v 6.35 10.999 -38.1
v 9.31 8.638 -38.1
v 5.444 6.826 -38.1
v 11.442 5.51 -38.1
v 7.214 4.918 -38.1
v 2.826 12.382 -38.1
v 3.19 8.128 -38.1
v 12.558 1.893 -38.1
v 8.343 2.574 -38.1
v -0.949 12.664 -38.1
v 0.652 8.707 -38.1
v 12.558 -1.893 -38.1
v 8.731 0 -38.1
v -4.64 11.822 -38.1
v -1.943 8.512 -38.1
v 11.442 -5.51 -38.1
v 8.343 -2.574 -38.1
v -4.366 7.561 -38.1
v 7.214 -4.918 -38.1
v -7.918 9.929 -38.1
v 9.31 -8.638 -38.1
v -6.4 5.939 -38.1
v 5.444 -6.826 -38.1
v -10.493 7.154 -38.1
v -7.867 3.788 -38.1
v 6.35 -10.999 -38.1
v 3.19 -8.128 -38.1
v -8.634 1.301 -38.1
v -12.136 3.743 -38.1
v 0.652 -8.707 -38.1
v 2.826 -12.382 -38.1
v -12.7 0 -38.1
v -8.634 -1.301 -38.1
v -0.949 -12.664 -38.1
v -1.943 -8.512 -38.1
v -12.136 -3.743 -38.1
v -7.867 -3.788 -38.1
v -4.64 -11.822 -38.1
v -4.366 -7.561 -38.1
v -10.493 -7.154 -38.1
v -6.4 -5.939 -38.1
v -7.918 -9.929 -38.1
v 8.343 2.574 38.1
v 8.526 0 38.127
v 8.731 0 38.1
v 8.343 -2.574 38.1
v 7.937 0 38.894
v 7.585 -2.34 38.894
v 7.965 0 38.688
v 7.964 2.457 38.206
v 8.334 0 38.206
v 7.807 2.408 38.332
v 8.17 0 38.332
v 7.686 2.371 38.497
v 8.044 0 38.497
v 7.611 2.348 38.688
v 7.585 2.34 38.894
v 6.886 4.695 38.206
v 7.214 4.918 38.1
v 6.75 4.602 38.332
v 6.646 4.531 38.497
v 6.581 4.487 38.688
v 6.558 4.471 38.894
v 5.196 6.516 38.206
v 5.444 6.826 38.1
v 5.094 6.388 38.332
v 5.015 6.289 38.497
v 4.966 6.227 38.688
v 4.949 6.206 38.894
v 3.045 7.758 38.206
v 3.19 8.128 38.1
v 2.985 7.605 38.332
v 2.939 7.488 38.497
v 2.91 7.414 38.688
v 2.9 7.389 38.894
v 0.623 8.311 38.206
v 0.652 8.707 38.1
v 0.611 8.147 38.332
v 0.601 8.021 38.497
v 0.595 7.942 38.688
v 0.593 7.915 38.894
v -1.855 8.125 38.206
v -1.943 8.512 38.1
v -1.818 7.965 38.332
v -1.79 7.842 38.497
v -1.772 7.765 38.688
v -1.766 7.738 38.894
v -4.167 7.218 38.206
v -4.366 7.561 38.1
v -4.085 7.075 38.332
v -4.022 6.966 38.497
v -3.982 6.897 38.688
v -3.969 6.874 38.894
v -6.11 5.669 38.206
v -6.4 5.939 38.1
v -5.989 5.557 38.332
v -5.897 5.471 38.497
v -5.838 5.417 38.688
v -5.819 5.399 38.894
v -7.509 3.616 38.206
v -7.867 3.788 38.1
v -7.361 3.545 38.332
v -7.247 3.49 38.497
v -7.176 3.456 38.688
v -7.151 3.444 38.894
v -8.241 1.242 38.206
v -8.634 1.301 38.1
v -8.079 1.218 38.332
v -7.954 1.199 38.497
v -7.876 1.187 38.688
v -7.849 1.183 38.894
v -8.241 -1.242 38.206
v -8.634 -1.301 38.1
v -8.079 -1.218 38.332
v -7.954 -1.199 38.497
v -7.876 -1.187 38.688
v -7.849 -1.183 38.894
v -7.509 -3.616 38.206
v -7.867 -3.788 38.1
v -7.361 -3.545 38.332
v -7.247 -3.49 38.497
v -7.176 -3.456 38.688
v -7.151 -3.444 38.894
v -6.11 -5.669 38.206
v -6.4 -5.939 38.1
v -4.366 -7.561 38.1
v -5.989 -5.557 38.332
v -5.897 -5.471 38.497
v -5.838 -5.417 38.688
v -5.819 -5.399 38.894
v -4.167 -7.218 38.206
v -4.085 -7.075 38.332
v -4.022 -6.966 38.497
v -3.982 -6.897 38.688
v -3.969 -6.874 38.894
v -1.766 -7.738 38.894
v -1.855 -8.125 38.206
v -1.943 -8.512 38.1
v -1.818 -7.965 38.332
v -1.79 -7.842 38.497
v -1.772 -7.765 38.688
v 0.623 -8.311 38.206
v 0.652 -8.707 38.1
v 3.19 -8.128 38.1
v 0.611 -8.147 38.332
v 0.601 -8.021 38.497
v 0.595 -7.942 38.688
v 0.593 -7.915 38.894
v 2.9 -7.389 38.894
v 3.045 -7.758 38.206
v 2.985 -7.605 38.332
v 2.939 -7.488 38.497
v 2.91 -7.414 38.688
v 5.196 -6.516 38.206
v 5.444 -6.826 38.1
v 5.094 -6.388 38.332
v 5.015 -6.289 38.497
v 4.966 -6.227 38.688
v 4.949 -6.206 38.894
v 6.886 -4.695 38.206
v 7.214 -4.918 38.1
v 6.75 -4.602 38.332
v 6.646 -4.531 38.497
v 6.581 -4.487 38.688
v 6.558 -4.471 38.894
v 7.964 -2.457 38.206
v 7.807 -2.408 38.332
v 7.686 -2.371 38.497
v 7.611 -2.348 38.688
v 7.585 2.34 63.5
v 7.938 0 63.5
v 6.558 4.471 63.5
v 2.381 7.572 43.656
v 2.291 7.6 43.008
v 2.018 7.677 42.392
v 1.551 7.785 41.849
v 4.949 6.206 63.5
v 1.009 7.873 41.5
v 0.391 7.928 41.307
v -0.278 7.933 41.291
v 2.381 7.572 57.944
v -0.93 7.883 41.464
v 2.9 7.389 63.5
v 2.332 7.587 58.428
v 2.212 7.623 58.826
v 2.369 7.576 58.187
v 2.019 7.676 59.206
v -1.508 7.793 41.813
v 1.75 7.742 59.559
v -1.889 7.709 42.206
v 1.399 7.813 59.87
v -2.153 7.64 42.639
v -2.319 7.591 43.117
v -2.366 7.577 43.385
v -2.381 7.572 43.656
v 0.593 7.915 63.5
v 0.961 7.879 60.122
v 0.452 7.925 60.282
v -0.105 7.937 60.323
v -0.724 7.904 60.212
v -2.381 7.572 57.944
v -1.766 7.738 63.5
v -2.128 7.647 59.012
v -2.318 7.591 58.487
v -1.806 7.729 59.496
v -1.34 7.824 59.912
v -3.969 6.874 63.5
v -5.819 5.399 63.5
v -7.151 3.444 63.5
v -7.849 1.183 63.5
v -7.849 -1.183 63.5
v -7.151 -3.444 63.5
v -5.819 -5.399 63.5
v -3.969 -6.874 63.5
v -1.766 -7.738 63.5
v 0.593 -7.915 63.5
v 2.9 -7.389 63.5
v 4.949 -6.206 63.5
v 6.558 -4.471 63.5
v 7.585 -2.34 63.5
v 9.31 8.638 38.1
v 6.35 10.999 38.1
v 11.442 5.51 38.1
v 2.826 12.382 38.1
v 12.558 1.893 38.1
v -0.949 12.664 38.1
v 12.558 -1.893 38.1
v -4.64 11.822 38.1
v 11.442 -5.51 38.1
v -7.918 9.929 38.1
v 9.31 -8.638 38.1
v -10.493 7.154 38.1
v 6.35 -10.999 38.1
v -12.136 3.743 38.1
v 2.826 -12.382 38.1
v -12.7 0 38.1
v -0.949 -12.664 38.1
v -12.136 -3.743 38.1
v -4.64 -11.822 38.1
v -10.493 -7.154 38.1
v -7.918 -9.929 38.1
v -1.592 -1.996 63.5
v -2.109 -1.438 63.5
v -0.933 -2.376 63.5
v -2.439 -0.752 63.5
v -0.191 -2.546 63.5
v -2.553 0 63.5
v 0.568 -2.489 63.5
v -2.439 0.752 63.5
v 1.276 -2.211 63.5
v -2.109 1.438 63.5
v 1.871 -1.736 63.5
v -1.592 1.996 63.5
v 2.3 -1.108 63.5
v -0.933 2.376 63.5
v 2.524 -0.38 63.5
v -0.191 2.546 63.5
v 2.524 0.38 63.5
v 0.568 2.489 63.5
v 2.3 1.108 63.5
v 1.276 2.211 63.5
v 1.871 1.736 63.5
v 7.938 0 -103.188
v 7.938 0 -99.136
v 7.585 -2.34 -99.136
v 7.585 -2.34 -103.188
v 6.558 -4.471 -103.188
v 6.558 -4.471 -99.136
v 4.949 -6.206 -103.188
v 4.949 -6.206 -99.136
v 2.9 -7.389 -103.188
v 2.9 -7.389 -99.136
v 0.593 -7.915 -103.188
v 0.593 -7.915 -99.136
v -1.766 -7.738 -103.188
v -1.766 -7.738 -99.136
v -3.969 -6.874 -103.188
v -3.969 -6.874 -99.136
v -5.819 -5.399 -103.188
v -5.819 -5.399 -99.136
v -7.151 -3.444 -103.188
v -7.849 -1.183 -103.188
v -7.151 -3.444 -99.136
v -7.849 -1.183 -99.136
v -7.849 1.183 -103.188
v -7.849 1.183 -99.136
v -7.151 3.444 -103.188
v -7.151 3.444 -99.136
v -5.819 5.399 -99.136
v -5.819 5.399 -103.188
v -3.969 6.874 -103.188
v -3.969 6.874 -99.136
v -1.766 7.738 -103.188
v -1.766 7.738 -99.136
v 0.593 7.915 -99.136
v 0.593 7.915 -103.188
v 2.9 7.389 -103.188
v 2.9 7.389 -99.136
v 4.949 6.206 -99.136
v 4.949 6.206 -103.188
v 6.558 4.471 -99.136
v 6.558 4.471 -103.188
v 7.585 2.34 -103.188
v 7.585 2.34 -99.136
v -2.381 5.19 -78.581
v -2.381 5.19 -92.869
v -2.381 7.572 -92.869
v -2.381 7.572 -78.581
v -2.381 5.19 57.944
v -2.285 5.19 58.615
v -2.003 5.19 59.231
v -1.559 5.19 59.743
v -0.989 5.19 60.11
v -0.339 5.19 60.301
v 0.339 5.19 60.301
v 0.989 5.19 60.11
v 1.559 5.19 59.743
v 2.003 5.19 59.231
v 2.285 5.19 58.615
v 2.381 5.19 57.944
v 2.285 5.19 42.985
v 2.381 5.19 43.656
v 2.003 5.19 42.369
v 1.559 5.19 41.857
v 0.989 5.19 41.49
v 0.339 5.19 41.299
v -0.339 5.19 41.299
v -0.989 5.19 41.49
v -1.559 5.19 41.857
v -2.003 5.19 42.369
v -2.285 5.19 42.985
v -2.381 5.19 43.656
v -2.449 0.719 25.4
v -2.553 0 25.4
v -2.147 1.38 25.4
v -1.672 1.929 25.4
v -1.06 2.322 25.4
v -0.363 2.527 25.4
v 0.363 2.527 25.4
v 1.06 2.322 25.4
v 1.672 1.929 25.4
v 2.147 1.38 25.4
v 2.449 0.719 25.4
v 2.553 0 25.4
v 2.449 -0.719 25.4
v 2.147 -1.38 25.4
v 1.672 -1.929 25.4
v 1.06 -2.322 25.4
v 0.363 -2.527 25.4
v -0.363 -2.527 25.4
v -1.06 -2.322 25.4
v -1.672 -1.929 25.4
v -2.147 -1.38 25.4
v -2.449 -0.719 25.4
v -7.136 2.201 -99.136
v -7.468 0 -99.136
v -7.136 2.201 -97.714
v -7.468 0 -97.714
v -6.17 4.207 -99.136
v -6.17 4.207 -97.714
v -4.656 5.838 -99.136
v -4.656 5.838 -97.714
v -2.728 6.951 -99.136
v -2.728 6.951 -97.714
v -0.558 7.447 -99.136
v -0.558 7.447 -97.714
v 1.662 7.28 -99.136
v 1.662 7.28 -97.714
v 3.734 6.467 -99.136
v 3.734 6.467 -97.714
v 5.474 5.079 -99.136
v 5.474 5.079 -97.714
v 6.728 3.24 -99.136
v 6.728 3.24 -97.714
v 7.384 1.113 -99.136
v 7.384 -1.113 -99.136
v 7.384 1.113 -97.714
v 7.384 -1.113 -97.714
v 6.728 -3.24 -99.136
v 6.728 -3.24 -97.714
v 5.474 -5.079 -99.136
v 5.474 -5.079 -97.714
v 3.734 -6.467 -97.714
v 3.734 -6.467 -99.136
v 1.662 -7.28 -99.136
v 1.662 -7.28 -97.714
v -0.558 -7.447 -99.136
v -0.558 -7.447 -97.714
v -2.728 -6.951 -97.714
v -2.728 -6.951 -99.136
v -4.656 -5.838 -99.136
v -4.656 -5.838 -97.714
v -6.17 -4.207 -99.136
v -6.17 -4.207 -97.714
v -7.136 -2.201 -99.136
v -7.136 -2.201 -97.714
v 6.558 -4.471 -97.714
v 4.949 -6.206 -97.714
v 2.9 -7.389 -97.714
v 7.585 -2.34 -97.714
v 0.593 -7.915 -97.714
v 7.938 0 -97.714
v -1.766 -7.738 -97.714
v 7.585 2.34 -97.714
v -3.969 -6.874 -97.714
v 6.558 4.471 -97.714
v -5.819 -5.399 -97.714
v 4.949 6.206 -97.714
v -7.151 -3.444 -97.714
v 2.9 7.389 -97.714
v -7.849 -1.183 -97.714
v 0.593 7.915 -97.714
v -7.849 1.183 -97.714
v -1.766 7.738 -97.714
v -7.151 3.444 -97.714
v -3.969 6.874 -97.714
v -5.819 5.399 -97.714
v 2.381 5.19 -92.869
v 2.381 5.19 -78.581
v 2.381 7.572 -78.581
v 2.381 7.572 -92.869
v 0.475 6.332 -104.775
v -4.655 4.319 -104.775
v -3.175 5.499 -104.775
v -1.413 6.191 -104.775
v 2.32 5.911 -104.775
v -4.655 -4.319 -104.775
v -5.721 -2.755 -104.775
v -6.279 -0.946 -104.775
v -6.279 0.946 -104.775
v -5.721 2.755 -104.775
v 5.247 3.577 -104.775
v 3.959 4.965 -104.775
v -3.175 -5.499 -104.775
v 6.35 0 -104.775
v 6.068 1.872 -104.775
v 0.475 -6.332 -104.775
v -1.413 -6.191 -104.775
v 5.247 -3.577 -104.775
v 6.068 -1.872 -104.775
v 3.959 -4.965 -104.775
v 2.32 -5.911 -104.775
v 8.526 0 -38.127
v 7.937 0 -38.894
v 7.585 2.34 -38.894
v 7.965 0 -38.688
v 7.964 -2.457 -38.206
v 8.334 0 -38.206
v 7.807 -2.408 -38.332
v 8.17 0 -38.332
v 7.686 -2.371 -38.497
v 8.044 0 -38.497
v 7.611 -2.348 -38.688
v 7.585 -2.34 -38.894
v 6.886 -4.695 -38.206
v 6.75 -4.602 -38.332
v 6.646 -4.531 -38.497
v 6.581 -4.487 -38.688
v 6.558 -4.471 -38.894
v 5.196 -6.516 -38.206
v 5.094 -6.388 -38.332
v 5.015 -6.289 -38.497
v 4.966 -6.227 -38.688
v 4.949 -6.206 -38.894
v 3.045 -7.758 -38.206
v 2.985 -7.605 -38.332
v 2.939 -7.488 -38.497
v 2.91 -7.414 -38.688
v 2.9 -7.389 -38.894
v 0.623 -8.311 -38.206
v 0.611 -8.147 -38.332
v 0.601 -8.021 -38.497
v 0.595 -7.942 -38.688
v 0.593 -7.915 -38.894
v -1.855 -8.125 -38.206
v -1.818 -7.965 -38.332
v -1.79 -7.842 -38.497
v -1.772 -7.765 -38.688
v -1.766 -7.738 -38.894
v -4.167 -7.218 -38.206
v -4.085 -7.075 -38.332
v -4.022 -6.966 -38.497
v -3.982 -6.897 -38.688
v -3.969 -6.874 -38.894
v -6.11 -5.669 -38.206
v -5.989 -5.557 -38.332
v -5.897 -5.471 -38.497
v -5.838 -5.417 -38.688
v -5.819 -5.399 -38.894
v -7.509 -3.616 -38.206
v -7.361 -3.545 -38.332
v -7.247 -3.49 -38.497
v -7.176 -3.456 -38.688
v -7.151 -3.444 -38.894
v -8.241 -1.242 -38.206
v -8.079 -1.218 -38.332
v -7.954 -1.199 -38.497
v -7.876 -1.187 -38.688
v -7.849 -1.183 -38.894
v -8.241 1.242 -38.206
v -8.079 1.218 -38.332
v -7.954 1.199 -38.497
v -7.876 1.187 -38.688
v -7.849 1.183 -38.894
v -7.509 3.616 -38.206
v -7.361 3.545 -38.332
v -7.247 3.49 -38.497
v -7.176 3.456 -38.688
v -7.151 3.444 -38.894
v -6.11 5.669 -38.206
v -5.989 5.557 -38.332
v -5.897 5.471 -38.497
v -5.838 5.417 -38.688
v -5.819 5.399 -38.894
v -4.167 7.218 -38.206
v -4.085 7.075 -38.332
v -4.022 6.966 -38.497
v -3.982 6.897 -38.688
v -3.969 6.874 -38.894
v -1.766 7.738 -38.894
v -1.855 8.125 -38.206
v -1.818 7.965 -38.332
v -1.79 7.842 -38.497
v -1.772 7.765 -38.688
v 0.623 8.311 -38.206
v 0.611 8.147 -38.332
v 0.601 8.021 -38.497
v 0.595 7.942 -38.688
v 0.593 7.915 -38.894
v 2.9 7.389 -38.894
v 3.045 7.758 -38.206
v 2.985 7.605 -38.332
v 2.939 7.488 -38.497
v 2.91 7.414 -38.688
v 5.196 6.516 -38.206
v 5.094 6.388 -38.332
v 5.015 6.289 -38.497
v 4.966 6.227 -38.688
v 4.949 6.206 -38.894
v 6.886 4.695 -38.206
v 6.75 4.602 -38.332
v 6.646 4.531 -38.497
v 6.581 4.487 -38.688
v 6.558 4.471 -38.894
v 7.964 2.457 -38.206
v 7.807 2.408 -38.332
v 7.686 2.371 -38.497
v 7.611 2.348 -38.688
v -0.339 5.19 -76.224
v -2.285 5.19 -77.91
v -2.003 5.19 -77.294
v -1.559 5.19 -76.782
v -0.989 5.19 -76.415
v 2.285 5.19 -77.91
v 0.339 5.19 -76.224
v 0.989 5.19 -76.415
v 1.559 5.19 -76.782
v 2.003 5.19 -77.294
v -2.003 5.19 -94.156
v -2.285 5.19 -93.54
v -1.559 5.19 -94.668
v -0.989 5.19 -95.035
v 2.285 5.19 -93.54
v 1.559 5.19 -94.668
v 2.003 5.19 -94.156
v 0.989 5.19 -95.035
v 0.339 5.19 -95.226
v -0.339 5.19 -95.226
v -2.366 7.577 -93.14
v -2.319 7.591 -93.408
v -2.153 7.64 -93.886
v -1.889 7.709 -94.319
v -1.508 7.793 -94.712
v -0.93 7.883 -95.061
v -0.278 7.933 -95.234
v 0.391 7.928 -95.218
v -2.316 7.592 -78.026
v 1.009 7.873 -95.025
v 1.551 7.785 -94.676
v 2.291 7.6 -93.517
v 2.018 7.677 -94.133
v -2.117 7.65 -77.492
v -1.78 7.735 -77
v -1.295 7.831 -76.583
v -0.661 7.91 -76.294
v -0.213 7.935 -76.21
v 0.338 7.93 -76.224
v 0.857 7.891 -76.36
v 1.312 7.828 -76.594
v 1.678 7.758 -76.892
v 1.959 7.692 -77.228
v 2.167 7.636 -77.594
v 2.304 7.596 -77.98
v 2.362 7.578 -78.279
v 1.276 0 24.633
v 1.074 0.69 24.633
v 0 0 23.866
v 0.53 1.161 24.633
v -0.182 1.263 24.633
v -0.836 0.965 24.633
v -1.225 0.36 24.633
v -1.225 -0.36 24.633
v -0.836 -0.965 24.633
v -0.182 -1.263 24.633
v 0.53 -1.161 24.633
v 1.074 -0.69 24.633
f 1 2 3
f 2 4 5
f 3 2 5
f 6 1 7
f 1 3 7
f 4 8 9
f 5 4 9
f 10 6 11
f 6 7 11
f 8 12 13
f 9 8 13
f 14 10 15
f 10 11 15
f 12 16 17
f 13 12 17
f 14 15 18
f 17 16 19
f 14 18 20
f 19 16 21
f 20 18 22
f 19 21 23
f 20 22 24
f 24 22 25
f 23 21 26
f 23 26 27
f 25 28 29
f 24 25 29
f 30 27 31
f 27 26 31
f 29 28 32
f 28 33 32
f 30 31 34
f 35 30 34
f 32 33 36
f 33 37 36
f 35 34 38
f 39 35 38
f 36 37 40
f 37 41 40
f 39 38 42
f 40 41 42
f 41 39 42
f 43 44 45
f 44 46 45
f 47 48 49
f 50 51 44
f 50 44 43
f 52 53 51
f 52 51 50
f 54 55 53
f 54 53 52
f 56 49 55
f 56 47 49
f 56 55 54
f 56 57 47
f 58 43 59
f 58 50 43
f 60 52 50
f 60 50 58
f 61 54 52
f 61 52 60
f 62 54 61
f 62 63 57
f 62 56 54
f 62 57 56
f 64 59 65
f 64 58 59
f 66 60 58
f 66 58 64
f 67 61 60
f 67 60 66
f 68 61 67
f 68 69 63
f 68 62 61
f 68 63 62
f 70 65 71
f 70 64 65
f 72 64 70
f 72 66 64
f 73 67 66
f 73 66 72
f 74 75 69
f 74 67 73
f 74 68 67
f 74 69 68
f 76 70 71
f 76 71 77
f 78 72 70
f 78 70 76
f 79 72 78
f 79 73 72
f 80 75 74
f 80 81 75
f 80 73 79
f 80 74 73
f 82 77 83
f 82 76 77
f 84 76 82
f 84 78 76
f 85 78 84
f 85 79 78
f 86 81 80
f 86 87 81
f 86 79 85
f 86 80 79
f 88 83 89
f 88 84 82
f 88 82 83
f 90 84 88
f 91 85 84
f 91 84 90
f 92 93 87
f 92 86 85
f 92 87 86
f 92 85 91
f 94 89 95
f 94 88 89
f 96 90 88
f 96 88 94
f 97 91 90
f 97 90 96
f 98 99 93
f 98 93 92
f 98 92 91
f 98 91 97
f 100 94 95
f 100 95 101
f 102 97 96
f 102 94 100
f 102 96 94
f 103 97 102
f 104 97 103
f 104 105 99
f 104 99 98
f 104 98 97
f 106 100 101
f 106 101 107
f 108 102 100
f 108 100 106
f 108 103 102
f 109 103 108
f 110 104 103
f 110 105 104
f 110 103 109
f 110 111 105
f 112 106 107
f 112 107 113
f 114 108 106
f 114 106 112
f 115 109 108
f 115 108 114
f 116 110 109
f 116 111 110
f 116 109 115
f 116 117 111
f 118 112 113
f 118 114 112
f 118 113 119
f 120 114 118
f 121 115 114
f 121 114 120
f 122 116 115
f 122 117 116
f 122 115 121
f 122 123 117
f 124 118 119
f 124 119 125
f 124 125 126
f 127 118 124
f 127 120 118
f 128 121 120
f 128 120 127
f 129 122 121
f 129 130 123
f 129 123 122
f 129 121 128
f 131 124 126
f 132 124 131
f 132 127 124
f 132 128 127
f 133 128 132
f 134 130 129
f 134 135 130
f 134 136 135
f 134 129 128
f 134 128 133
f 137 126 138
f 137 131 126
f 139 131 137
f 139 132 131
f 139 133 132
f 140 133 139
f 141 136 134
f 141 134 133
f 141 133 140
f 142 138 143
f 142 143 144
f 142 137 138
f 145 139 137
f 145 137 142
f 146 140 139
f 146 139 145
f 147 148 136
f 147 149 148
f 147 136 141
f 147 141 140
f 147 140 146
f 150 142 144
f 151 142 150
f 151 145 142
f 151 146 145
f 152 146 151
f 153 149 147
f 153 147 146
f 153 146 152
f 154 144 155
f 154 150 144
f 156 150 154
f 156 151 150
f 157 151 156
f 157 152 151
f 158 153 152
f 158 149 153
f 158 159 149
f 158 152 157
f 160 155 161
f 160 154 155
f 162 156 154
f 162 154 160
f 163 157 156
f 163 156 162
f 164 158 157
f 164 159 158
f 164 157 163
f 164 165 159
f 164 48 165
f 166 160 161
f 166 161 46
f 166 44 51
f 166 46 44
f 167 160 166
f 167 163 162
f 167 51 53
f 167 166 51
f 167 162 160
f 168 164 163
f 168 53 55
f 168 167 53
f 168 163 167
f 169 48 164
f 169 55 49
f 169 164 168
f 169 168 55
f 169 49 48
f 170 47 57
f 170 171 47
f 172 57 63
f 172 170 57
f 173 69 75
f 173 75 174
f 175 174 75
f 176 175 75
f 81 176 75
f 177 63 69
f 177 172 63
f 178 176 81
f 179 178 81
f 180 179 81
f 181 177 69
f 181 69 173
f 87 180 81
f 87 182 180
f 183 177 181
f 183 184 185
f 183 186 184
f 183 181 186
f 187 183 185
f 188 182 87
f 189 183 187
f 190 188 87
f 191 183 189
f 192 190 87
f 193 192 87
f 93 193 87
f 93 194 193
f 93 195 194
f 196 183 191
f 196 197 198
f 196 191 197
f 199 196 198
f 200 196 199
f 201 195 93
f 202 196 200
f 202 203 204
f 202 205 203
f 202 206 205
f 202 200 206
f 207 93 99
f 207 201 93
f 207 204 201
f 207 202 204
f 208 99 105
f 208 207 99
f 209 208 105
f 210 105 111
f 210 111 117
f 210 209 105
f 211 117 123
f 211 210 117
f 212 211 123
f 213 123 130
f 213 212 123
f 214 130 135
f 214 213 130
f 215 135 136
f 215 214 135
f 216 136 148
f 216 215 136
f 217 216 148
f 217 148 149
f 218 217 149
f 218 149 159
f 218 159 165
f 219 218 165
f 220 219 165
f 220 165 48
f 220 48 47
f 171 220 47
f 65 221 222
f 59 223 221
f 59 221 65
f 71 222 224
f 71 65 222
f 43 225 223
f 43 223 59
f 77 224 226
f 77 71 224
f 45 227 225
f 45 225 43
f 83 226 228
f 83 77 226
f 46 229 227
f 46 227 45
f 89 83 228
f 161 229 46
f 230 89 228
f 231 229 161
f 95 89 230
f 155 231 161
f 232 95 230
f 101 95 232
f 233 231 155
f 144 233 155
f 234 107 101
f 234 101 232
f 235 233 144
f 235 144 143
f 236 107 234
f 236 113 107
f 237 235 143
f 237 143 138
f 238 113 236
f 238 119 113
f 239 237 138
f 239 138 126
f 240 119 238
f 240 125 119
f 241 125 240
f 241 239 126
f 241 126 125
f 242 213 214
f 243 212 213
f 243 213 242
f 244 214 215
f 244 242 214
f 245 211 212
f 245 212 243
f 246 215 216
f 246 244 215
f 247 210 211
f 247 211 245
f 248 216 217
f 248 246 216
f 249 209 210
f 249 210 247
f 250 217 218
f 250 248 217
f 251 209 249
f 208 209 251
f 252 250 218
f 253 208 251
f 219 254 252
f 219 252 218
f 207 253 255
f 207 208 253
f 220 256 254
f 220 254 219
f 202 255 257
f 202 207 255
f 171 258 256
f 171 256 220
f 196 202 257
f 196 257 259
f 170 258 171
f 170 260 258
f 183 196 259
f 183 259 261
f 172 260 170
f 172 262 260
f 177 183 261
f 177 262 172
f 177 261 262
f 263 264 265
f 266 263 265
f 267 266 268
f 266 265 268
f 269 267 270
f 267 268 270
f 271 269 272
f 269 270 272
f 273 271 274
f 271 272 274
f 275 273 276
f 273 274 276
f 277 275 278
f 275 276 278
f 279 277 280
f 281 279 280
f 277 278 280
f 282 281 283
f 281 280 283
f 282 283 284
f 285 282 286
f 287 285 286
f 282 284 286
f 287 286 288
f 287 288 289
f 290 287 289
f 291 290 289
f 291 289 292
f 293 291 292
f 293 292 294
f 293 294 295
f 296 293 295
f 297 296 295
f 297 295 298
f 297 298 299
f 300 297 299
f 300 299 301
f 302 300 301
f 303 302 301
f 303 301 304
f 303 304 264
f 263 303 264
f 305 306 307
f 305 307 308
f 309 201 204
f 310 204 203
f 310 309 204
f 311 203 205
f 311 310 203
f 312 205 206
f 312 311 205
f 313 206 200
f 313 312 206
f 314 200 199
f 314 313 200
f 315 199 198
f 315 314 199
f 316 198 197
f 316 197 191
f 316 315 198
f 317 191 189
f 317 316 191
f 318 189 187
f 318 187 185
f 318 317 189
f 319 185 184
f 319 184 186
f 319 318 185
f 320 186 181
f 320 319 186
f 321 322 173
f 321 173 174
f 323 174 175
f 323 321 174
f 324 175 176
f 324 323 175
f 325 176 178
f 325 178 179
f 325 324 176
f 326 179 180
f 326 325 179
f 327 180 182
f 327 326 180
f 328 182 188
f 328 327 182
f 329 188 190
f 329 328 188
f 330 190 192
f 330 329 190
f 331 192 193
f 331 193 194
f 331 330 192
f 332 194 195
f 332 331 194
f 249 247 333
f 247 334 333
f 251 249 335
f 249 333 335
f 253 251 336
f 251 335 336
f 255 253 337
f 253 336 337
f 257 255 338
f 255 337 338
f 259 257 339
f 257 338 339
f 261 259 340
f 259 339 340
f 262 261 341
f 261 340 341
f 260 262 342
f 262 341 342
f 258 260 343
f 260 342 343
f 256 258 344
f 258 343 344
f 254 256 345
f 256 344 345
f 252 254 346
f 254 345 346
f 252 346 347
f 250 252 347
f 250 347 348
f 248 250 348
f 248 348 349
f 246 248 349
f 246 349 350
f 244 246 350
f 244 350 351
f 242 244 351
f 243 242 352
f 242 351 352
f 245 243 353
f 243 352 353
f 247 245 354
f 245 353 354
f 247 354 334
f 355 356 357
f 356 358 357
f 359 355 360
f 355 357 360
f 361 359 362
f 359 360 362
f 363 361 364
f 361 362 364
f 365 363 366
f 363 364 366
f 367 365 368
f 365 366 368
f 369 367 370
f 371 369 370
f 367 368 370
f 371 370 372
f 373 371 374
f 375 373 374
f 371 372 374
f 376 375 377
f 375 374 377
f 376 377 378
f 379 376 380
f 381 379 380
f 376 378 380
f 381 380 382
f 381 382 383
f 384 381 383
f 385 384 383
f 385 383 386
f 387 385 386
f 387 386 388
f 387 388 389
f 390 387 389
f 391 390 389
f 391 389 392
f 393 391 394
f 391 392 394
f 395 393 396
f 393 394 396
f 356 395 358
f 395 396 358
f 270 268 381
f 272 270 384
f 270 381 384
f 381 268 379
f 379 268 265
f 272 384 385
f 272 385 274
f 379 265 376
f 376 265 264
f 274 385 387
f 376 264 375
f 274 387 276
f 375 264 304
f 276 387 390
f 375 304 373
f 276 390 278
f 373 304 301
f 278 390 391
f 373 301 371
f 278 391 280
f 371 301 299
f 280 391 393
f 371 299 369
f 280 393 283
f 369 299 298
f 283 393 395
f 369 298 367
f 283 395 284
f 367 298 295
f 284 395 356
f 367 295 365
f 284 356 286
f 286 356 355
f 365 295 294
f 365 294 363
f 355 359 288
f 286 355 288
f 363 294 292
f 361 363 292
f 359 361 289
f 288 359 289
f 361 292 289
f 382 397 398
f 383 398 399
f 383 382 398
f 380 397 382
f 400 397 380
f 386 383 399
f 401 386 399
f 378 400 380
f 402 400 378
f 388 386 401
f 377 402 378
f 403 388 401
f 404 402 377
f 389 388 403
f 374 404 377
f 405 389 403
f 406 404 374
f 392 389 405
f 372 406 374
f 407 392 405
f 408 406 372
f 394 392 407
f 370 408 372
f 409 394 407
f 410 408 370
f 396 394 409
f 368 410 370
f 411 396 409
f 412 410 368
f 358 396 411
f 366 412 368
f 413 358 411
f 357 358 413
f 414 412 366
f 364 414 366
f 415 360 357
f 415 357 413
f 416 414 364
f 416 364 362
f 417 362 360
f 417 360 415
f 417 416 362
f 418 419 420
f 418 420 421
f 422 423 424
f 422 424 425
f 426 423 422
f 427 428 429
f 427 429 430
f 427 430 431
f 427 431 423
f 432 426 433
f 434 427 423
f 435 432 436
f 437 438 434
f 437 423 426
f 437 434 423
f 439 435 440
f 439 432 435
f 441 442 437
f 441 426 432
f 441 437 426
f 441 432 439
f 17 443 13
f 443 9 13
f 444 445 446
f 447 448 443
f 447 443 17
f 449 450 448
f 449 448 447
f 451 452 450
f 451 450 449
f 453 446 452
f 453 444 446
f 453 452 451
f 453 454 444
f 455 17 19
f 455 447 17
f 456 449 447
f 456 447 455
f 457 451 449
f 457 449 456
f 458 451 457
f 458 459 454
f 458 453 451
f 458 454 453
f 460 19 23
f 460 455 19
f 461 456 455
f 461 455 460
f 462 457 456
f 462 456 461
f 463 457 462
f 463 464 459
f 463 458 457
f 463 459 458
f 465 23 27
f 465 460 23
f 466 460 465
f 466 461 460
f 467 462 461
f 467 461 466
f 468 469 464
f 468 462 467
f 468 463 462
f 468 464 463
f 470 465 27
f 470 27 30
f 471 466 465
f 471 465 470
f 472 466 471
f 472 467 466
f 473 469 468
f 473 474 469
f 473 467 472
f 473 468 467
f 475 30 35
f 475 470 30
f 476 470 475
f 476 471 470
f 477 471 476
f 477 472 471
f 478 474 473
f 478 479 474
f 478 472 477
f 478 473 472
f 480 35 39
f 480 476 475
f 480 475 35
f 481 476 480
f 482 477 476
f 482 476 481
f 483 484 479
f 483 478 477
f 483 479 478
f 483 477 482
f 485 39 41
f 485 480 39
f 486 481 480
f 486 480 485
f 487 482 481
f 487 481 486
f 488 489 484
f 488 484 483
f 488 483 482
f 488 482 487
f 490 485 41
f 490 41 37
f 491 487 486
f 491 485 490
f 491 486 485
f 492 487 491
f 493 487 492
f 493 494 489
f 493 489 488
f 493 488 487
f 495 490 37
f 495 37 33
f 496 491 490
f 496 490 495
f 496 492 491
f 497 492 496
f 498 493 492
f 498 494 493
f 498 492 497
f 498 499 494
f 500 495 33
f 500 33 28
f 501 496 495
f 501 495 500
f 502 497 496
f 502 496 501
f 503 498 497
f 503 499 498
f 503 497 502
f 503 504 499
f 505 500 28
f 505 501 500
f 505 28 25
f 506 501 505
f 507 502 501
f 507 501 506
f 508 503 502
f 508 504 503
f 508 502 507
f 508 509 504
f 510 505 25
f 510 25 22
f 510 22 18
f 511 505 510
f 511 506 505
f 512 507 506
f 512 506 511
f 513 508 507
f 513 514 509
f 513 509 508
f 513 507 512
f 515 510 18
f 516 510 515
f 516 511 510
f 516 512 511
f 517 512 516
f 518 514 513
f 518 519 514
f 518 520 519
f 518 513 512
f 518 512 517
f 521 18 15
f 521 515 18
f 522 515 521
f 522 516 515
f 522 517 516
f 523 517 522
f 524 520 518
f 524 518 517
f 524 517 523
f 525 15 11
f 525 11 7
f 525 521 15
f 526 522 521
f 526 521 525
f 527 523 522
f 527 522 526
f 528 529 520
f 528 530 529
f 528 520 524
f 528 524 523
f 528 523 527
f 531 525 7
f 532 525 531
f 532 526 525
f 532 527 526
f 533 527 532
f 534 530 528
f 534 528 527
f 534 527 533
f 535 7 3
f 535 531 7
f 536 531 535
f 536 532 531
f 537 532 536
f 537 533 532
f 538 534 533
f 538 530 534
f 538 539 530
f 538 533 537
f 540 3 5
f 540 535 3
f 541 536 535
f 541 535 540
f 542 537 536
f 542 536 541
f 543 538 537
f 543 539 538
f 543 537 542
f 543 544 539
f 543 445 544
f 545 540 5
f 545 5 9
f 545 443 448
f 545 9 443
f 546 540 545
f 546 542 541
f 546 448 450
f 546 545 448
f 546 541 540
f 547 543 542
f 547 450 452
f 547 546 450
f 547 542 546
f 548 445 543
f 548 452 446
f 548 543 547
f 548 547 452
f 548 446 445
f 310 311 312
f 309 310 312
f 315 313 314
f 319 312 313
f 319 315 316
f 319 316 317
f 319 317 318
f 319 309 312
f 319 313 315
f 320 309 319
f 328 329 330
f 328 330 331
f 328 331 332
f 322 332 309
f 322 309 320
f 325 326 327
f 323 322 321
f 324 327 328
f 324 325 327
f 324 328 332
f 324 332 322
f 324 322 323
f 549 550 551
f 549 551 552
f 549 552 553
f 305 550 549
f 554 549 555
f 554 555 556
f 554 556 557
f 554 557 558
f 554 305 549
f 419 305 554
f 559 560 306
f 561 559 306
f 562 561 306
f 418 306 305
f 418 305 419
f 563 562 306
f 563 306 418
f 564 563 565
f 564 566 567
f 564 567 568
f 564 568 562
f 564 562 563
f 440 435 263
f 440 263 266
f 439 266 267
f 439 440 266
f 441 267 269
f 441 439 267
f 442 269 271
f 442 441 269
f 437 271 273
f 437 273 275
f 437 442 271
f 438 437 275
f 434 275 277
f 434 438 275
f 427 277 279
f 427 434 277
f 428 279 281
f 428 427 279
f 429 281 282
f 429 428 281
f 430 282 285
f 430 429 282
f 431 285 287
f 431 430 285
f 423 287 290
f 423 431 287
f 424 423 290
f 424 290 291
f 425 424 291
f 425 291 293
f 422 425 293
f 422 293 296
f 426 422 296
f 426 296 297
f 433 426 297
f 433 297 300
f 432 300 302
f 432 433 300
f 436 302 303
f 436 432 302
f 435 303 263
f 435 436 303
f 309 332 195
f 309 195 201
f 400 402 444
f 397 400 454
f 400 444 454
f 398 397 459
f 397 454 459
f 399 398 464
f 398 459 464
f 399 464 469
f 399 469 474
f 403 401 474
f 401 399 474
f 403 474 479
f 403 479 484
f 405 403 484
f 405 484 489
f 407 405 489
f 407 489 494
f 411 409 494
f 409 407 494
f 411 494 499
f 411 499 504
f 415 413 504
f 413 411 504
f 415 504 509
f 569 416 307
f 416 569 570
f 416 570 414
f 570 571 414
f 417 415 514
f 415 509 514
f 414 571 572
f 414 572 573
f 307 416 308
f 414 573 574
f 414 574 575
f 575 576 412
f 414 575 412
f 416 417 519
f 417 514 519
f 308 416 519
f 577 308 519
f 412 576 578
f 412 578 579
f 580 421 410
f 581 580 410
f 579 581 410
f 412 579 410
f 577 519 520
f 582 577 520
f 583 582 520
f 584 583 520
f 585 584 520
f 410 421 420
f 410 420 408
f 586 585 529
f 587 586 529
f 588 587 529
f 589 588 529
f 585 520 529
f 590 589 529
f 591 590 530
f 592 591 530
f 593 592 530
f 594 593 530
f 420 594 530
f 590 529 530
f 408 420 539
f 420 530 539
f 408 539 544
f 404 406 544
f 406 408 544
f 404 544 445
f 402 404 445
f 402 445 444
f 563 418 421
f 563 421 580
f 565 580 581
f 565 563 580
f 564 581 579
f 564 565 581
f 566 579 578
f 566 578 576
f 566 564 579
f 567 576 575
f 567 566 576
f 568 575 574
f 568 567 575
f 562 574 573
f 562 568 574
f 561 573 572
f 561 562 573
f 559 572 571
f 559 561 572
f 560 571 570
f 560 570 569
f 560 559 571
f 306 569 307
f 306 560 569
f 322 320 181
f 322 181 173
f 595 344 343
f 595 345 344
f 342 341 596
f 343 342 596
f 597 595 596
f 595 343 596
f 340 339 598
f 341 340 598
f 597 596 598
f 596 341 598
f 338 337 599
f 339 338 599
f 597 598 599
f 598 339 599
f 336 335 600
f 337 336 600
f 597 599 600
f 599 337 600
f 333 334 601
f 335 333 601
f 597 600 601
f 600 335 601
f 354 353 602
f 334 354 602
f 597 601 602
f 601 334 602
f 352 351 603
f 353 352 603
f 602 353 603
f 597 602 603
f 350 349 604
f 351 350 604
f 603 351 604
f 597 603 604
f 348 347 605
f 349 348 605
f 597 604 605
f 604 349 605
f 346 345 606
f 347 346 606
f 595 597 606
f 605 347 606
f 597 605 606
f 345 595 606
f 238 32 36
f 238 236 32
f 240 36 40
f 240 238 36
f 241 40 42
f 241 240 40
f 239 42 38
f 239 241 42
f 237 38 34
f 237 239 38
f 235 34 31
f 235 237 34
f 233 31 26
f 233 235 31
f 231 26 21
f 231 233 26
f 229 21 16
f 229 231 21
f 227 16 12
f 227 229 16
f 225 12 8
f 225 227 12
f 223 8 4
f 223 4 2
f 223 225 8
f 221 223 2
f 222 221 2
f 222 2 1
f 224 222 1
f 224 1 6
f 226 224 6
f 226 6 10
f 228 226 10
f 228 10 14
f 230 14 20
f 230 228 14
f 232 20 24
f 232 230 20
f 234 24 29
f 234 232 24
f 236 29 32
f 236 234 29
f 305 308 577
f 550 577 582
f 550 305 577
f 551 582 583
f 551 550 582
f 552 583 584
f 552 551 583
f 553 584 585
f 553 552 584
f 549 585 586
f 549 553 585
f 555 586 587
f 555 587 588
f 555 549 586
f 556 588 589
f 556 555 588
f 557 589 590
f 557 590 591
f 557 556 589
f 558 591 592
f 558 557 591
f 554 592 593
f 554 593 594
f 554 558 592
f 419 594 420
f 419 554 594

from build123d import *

# Parameters (mm, degrees)
SKETCH1_R                          = 12.7
BOSS_EXTRUDE1_DEPTH                = 38.1
SKETCH3_R                          = 7.9375
BOSS_EXTRUDE2_DEPTH                = 66.675
SKETCH8_R                          = 12.7
SKETCH8_R_2                        = 7.4676
CUT_EXTRUDE1_DEPTH                 = 0.7112
BOSS_EXTRUDE3_START                = 25.4
SKETCH9_R                          = 7.9375
BOSS_EXTRUDE3_DEPTH                = 25.4
FILLET1_R                          = 0.79375
F_1_4_20_TAPPED_HOLE1_D            = 5.1054
F_1_4_20_TAPPED_HOLE1_DEPTH        = 38.1
F_1_4_20_TAPPED_HOLE1_TIP          = 1.533816902
F_3_16_START                       = 5.19049
F_3_16_0_1875_DIAMETER_SLOT1_DEPTH = 3.80951
CHAMFER1_SIZE                      = 1.5875


with BuildPart() as part:
    # Sketch1 → Boss-Extrude1 (new, symmetric)
    with BuildSketch(Plane.XY):
        with Locations(Location((0, 0, 0), (0, 0, 180))):
            Circle(SKETCH1_R)
    extrude(amount=BOSS_EXTRUDE1_DEPTH, both=True)

    # Sketch3 → Boss-Extrude2 (add)
    with BuildSketch(Plane(origin=(0, 0, -38.1), x_dir=(-1, 0, 0), z_dir=(0, 0, -1))):
        with Locations(Location((0, 0, 0), (0, 0, 180))):
            Circle(SKETCH3_R)
    extrude(amount=BOSS_EXTRUDE2_DEPTH)

    # Sketch8 → Cut-Extrude1 (cut, symmetric)
    with BuildSketch(Plane(origin=(0, 0, -98.425), x_dir=(-1, 0, 0), z_dir=(0, 0, -1))):
        Circle(SKETCH8_R)
        Circle(SKETCH8_R_2, mode=Mode.SUBTRACT)
    extrude(amount=CUT_EXTRUDE1_DEPTH, both=True, mode=Mode.SUBTRACT)

    # Sketch9 → Boss-Extrude3 (add)
    with BuildSketch(Plane.XY.offset(38.1).offset(BOSS_EXTRUDE3_START)):
        Circle(SKETCH9_R)
    extrude(amount=-BOSS_EXTRUDE3_DEPTH)

    # Fillet1
    fillet1_edges = [part.edges().sort_by_distance(p)[0] for p in [
        (-7.9375, 0, 38.1),
        (-7.9375, 0, -38.1),
    ]]
    fillet(fillet1_edges, radius=FILLET1_R)

    # 1/4-20 Tapped Hole1
    with Locations(Plane.XY.offset(63.5)):
        with Locations((0, 0)):
            Hole(F_1_4_20_TAPPED_HOLE1_D / 2, depth=F_1_4_20_TAPPED_HOLE1_DEPTH)
            with Locations((0, 0, -(F_1_4_20_TAPPED_HOLE1_DEPTH + F_1_4_20_TAPPED_HOLE1_TIP / 2))):  # 118° drill point
                Cone(0, F_1_4_20_TAPPED_HOLE1_D / 2, F_1_4_20_TAPPED_HOLE1_TIP, mode=Mode.SUBTRACT)

    # 3/16 (0.1875) Diameter Slot1: read off the stored shape, not the designer's step
    # 3/16 (0.1875) Diameter Slot1 outline → 3/16 (0.1875) Diameter Slot1 (cut)
    with BuildSketch(Plane(origin=(0, 0, 0), x_dir=(1, 0, 0), z_dir=(0, 1, 0)).offset(F_3_16_START)):
        with BuildLine():
            ThreePointArc((2.38125, -43.65625), (0, -41.275), (-2.38125, -43.65625))
            Line((-2.38125, -43.65625), (-2.38125, -57.94375))
            ThreePointArc((-2.38125, -57.94375), (0, -60.325), (2.38125, -57.94375))
            Line((2.38125, -57.94375), (2.38125, -43.65625))
        make_face()
        with BuildLine():
            ThreePointArc((2.38125, 92.86875), (0, 95.25), (-2.38125, 92.86875))
            Line((-2.38125, 92.86875), (-2.38125, 78.58125))
            ThreePointArc((-2.38125, 78.58125), (0, 76.2), (2.38125, 78.58125))
            Line((2.38125, 78.58125), (2.38125, 92.86875))
        make_face()
    extrude(amount=F_3_16_0_1875_DIAMETER_SLOT1_DEPTH, mode=Mode.SUBTRACT)

    # Chamfer1
    chamfer1_edges = [part.edges().sort_by_distance(p)[0] for p in [
        (-7.9375, 0, -104.775),
    ]]
    chamfer(chamfer1_edges, length=CHAMFER1_SIZE)


solid = part.part
